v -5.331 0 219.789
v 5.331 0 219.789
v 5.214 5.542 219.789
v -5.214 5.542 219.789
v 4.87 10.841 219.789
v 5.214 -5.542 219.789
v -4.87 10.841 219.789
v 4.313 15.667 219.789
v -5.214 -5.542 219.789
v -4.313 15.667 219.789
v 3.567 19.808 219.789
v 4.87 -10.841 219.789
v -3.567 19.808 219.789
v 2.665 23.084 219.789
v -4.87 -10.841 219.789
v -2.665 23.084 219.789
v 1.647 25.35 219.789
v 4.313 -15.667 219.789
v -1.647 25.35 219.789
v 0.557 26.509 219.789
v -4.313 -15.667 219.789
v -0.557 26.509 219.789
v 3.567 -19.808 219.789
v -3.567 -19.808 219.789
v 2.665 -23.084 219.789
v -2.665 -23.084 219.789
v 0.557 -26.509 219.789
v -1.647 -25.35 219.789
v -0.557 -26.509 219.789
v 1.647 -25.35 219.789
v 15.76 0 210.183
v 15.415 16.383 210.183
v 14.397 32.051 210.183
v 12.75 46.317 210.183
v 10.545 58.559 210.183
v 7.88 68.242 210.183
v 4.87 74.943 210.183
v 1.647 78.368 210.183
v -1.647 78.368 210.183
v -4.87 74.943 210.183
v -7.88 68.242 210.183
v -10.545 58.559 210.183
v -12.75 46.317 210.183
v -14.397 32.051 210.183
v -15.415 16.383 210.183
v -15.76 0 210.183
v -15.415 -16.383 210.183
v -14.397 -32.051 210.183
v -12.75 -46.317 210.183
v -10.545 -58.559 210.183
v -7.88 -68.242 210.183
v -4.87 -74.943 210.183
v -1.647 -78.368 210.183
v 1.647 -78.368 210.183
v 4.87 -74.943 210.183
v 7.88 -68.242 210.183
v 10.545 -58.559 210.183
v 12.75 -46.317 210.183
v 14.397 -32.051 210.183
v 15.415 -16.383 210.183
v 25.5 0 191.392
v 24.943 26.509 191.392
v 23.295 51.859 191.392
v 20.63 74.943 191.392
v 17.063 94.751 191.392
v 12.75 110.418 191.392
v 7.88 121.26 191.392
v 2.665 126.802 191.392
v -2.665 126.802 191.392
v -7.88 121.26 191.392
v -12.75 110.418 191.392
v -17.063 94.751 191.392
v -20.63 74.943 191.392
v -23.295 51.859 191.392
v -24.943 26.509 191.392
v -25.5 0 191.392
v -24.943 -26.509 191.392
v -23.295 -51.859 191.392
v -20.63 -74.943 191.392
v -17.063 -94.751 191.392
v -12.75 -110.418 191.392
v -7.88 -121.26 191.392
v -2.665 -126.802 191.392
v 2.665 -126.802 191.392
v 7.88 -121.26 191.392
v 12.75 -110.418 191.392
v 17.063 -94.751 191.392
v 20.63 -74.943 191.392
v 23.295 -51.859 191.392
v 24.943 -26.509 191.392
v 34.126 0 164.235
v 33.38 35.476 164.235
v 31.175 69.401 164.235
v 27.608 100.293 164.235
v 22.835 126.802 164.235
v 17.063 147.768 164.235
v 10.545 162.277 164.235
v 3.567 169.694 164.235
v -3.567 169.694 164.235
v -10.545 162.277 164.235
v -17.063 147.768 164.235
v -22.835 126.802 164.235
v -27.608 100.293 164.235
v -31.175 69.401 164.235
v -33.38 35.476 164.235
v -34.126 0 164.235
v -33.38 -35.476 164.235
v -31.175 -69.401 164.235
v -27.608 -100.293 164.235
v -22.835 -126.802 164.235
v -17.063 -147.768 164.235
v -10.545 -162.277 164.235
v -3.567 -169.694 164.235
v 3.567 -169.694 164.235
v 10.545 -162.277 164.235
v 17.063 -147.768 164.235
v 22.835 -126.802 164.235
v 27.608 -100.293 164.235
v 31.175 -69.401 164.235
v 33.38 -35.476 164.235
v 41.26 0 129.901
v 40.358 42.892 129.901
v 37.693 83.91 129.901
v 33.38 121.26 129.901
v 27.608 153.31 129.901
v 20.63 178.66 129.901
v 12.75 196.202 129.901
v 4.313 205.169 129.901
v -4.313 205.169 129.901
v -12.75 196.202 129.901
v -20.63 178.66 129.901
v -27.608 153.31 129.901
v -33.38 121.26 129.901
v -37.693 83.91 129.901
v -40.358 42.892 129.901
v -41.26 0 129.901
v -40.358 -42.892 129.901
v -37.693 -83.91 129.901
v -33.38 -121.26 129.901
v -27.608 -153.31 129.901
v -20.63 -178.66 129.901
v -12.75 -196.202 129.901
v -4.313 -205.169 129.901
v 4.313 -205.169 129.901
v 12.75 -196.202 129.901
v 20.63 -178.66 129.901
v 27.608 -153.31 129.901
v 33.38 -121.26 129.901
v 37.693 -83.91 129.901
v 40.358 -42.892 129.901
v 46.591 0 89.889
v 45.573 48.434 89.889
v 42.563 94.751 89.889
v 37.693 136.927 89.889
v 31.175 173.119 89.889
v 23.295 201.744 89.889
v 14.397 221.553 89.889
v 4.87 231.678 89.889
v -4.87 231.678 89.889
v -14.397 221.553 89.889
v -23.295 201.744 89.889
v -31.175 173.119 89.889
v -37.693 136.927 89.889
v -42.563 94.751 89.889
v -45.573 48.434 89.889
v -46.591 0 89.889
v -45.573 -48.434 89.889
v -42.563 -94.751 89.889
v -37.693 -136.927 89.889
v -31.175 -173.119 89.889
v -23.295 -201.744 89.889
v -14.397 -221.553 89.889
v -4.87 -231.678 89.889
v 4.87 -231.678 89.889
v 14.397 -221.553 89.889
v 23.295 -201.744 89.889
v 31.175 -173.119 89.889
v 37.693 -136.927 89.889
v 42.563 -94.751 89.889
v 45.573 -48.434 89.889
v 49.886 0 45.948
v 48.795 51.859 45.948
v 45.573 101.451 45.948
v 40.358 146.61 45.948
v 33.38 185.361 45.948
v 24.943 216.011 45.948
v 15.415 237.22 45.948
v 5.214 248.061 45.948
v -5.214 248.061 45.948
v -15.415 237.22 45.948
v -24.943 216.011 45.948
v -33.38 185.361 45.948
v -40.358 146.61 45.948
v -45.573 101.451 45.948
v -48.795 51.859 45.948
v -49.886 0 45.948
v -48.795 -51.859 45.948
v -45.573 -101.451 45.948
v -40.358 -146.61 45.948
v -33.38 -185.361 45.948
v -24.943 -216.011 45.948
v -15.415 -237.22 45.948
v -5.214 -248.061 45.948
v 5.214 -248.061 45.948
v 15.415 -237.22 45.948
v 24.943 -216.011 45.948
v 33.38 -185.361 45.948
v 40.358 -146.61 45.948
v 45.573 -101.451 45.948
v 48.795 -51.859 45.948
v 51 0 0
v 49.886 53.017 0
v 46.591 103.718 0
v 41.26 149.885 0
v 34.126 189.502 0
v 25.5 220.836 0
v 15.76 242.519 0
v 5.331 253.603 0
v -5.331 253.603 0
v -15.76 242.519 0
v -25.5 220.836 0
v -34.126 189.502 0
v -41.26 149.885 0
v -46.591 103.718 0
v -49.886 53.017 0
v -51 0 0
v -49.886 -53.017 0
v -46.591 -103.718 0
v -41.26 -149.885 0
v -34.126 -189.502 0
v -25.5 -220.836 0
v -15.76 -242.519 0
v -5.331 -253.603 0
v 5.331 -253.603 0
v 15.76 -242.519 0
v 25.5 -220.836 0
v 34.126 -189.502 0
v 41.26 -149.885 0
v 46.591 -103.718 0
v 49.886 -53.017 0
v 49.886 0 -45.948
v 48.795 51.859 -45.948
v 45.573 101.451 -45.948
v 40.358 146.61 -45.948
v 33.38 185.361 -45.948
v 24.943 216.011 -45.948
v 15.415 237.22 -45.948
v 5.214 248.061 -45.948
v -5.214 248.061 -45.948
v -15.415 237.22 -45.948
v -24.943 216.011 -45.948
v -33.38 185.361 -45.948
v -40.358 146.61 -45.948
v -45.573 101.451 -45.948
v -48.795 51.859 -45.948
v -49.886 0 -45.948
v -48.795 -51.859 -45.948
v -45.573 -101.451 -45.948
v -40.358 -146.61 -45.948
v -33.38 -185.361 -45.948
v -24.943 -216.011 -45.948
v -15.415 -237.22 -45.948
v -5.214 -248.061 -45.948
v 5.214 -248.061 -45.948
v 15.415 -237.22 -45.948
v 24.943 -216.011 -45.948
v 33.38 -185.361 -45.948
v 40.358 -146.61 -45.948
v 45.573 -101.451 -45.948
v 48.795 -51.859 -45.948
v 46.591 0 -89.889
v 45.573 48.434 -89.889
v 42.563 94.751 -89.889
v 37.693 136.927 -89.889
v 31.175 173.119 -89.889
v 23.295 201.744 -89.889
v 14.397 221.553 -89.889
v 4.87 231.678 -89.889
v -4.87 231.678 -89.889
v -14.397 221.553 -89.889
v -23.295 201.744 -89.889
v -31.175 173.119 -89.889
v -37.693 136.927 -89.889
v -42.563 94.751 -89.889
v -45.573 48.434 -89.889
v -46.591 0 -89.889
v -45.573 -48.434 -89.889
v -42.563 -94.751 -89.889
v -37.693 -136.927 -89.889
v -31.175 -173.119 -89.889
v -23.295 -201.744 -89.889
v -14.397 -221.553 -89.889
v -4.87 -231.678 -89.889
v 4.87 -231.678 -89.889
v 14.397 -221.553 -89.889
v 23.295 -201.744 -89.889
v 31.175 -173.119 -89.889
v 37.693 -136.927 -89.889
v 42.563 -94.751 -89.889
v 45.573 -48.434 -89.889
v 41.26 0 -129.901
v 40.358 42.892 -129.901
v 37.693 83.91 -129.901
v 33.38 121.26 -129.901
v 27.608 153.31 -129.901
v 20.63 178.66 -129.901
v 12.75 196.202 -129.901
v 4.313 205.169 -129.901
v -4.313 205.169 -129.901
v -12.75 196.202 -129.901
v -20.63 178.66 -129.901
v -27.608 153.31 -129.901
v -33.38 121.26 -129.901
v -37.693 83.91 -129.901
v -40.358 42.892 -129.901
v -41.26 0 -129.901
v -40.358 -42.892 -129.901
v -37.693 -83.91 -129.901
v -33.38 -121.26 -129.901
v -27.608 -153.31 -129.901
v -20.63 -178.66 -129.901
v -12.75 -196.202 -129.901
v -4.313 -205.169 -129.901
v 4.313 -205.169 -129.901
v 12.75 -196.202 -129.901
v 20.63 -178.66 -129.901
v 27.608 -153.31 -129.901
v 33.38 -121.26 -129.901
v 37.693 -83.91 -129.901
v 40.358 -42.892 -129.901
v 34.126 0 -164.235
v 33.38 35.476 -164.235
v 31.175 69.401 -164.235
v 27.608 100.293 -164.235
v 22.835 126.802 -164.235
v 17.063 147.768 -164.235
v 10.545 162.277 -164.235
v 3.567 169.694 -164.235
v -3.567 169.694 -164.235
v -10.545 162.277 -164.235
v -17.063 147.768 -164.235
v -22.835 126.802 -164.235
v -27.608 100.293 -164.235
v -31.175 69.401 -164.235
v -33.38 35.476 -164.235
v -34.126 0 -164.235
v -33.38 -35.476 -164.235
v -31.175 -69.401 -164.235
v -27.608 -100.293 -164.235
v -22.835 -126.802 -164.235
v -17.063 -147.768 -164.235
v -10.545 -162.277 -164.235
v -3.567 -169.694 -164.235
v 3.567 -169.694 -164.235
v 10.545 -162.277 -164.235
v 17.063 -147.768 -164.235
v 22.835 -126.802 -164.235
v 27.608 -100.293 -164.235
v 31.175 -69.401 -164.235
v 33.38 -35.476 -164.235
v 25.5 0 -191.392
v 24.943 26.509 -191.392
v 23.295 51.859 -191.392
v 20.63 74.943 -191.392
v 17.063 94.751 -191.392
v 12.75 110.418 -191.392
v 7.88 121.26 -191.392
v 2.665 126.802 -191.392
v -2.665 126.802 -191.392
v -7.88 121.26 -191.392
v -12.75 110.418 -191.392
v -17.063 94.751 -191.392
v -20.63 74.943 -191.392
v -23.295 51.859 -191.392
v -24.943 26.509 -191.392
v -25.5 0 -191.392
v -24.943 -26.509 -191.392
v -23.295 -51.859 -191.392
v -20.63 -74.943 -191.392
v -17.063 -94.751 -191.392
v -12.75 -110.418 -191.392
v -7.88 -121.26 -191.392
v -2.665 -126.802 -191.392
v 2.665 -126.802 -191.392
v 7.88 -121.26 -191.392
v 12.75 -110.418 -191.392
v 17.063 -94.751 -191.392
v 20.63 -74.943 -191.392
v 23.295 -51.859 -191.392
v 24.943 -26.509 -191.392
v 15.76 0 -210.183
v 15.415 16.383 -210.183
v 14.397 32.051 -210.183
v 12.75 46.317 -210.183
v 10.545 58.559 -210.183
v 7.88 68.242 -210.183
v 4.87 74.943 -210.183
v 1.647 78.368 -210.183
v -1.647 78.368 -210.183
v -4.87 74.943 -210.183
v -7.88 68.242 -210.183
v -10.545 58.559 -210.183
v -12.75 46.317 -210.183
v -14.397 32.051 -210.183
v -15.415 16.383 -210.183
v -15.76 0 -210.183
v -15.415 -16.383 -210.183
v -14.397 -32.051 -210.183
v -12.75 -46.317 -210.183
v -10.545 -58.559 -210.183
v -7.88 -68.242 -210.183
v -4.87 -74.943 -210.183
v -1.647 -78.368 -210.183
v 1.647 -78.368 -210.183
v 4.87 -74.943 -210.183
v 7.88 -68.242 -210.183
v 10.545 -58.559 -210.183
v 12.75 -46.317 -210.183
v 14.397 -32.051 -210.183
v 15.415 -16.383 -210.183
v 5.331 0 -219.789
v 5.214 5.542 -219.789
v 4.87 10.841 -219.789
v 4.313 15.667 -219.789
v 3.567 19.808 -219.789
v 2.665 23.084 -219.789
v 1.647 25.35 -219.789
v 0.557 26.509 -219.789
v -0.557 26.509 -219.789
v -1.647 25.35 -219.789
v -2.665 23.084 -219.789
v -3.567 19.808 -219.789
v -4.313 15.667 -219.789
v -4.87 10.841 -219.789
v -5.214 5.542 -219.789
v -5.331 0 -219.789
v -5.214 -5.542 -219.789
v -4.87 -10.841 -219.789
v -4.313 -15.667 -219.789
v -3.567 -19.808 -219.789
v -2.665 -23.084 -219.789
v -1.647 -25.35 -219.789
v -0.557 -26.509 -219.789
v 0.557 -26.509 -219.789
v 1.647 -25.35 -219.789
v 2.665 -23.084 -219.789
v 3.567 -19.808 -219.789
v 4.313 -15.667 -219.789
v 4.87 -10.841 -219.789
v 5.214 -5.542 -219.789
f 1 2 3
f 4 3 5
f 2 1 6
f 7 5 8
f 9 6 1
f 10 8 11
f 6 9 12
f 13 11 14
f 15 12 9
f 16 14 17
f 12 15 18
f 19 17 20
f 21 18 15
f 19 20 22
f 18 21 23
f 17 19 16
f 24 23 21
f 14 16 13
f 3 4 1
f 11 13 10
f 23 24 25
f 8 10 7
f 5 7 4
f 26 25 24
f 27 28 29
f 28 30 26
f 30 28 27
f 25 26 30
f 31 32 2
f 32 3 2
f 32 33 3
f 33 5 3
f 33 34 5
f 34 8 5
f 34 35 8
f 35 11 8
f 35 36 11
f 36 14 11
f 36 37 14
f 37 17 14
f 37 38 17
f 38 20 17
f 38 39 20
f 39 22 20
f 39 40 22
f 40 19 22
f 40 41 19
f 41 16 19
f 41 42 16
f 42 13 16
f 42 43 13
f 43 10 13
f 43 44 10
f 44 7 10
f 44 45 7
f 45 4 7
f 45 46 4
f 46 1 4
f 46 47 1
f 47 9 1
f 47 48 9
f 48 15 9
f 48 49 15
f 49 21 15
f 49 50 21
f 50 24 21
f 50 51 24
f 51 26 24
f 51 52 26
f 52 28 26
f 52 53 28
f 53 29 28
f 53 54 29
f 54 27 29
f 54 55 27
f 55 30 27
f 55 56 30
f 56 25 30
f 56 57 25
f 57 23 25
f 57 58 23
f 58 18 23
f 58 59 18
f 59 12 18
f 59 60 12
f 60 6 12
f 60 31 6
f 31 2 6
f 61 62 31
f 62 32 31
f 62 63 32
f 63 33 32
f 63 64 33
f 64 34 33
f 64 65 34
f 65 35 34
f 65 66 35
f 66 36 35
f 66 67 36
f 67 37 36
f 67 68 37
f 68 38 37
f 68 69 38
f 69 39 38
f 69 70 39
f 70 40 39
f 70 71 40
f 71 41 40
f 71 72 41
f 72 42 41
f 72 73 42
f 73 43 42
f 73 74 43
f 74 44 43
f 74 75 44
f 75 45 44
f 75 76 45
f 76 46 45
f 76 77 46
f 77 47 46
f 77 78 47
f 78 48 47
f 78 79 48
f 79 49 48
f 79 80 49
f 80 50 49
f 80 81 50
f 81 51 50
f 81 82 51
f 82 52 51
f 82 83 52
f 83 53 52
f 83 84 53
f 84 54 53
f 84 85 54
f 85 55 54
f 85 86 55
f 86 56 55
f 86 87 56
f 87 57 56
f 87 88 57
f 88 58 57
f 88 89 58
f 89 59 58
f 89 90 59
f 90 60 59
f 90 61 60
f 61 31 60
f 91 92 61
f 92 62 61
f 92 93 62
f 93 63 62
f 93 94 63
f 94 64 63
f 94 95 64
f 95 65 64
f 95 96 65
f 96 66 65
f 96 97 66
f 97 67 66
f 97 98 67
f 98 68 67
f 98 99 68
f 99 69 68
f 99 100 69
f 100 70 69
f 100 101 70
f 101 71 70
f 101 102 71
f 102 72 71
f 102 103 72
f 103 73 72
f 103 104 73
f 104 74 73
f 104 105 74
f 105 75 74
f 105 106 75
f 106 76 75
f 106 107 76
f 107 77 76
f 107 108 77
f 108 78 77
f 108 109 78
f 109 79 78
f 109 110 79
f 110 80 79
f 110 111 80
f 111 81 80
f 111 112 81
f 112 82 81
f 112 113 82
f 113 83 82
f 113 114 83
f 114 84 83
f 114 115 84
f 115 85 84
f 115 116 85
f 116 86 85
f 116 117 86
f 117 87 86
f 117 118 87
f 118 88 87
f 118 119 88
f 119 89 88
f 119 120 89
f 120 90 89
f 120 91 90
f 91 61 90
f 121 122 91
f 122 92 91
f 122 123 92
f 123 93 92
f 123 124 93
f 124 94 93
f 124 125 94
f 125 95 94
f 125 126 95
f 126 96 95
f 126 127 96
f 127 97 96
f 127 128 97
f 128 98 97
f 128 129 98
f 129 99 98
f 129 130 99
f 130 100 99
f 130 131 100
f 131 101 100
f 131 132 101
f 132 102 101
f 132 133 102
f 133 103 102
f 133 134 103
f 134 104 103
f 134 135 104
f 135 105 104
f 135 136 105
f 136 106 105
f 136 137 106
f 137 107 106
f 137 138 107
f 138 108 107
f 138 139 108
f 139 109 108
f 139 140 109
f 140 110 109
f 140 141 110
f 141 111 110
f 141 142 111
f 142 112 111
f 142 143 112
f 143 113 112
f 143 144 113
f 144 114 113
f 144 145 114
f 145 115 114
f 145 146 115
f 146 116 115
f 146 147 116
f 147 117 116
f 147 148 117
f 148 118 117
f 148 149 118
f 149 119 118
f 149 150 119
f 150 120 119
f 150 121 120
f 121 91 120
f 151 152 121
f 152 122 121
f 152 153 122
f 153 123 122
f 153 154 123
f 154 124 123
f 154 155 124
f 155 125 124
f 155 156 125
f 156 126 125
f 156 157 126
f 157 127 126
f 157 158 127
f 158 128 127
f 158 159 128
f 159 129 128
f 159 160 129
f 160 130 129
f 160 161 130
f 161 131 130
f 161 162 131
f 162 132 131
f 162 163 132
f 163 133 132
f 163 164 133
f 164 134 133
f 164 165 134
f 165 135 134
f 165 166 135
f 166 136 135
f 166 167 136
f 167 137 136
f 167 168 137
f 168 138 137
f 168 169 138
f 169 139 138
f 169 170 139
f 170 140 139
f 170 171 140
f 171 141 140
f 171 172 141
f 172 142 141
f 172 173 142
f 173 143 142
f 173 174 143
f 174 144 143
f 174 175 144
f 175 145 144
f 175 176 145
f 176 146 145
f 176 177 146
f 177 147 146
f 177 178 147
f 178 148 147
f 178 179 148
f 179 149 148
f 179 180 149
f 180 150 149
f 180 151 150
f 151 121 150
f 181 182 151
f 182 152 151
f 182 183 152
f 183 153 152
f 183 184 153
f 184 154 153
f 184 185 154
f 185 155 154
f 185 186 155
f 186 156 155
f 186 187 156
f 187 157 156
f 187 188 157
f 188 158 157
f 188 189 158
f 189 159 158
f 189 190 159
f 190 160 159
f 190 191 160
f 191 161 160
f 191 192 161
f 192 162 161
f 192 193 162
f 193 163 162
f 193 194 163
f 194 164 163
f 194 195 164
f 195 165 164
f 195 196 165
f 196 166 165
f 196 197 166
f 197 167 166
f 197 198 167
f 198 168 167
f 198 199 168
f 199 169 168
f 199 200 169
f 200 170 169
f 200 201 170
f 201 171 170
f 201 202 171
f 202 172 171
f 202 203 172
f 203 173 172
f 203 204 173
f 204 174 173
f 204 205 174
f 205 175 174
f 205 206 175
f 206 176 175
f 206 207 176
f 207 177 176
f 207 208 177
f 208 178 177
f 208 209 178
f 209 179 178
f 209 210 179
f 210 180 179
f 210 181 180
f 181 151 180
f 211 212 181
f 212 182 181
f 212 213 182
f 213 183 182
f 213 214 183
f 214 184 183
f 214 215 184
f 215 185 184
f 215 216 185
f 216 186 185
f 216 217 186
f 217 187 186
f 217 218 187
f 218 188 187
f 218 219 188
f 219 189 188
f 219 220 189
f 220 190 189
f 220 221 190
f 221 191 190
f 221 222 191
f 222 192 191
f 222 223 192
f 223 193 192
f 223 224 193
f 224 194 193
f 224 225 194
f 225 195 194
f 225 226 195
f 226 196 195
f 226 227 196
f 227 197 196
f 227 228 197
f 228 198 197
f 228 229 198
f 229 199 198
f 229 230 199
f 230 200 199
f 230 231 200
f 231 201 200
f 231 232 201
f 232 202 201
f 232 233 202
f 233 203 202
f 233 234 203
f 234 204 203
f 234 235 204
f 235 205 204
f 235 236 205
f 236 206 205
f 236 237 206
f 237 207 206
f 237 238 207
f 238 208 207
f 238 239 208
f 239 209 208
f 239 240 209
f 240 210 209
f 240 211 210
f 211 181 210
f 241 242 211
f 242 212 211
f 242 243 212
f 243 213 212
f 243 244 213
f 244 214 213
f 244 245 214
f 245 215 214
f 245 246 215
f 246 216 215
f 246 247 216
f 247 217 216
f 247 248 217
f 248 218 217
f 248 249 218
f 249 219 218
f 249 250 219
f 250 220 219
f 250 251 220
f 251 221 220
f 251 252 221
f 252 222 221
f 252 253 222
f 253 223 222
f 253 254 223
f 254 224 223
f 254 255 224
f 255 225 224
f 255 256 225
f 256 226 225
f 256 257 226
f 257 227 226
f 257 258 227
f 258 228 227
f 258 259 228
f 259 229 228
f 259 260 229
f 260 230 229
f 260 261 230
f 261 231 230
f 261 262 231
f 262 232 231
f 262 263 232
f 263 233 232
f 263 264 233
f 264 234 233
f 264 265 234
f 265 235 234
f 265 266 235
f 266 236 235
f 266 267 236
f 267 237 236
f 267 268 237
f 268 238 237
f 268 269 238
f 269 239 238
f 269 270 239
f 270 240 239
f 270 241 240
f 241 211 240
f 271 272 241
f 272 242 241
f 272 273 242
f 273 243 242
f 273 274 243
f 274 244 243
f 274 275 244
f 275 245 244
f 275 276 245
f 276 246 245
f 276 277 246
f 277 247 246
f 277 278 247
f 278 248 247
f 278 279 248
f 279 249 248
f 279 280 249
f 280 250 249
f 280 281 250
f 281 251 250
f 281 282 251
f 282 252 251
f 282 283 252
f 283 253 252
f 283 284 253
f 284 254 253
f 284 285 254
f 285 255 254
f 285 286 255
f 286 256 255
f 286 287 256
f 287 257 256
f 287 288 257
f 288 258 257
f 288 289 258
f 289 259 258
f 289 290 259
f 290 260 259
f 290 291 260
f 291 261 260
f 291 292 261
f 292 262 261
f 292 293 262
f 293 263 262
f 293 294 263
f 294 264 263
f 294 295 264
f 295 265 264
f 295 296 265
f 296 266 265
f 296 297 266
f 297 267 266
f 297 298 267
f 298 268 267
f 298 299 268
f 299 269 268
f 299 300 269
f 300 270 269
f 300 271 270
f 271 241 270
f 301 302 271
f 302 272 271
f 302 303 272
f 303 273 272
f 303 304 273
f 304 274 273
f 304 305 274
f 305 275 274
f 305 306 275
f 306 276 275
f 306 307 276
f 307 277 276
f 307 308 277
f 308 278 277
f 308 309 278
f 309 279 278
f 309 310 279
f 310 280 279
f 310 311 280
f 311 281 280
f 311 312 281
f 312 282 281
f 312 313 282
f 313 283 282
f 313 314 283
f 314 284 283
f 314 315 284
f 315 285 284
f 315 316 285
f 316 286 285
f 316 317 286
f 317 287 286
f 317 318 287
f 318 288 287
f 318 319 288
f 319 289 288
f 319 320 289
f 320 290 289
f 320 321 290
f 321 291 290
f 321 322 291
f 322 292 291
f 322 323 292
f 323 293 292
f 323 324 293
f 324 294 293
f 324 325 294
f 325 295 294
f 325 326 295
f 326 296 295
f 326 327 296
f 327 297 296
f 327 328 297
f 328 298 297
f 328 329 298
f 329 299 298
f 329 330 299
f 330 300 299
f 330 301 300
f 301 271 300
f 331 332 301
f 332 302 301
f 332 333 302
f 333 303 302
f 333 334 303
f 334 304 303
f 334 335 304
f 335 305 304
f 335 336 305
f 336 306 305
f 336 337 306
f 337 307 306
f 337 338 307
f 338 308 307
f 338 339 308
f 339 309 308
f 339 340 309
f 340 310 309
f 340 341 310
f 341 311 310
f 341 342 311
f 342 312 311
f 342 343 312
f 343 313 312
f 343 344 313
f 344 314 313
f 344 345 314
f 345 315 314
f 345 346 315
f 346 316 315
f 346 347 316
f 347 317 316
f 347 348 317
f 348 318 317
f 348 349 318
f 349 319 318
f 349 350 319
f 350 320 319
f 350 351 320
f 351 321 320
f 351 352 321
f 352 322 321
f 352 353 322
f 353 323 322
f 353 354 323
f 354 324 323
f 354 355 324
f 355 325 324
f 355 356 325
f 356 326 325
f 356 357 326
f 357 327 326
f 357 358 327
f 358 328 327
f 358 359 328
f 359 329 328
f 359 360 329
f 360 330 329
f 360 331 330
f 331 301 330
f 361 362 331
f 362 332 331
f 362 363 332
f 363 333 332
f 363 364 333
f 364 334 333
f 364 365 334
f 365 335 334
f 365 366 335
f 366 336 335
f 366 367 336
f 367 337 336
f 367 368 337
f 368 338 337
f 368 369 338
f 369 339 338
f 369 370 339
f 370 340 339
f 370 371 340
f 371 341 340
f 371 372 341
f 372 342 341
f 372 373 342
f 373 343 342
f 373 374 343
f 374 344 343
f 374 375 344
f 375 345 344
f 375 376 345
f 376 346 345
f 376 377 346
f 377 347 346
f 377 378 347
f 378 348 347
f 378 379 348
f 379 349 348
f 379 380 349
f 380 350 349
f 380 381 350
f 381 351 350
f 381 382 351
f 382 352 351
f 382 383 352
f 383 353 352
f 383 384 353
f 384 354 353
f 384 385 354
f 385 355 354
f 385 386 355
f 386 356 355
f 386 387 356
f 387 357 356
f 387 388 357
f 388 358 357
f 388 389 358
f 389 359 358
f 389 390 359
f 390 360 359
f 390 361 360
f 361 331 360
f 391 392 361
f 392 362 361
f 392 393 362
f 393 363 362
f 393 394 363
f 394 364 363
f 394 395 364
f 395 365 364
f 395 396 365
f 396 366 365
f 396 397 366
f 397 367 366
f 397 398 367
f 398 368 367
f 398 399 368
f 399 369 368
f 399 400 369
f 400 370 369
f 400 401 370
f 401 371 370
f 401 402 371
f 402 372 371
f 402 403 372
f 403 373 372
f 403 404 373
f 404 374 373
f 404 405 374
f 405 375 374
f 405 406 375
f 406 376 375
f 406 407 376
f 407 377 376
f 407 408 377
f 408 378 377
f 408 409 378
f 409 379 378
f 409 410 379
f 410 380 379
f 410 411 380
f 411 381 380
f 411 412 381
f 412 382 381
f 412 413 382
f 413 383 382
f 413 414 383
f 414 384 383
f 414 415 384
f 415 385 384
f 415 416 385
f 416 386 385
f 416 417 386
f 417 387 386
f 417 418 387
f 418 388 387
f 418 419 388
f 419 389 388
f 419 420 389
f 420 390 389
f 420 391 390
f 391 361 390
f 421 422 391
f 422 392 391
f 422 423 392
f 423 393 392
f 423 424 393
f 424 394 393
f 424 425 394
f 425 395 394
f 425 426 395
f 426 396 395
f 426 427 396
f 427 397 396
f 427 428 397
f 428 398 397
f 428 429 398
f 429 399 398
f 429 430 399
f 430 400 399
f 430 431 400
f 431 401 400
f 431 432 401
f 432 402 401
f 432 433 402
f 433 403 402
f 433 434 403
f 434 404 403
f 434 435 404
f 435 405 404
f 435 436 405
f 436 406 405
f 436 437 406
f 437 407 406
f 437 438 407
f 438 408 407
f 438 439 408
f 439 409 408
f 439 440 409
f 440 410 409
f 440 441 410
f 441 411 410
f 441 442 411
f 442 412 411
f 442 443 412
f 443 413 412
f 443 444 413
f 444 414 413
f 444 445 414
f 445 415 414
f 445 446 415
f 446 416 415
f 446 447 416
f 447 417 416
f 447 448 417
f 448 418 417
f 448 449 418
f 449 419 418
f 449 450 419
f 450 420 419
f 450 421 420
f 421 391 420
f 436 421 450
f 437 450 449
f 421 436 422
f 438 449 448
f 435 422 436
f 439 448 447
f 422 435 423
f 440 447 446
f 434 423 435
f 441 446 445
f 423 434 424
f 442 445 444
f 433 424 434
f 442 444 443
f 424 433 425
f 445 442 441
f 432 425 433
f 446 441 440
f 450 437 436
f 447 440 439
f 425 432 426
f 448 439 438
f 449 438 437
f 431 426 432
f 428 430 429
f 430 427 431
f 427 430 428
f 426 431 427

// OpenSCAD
// Generated by SolidPython 1.0.1 on 2020-07-29 00:46:45


scale(v = [3, 15, 13]) {
	sphere(r = 17);
}
/***********************************************
*********      SolidPython code:      **********
************************************************
 
# import packages: SolidPython
from solid import *
from solid.utils import *
from itertools import chain, combinations, permutations


class Resize:

    def __init__(self, scad_file):
        self.scad_file = scad_file
        #self.scad_file = import_scad(scad_file)
        # cone/cylinder param:
        self.r1 = 0
        self.r2 = 0
        self.h = 0
        # rectangular prism param:
        self.w = 0
        self.l = 0
        # ellipse param:
        self.r = 0

    # import OpenScad code (file name corresponds to shape)


    # classify shape + parameters
    def assign(self, param1, param2, param3):
        if self.scad_file == 'cone.scad':
            self.r1 = param1
            self.r2 = param2
            self.h = param3
        elif self.scad_file == 'cylinder.scad':
            self.r1 = param1
            self.r2 = param2
            self.h = param3
        elif self.scad_file == 'rectangularPrism.scad':
            self.h = param1
            self.l = param2
            self.w = param3
        else:
            self.r = param1
            self.h = param2

    # resize parameters
    def iterate(self):
        x = range(3, 20, 2)
        i = 1
        if self.scad_file == 'cone.scad':
            tempList = list(permutations(x, 2))
            for temp in tempList:
                param1 = temp[0]
                param2 = temp[1]
                filepath = 'produced_scad_files/' + 'cone' + str(param1) + '_' + str(param2) + '_' + '.scad'
                scad_render_to_file(cylinder(h=param1, r1=param2, r2=0), filepath)

        elif self.scad_file == 'cylinder.scad':
            tempList = list(permutations(x, 3))
            for temp in tempList:
                param1 = temp[0]
                param2 = temp[1]
                filepath = 'produced_scad_files/' + 'cylinder' + str(param1) + '_' + str(param2) + '_' + '.scad'
                scad_render_to_file(cylinder(h=param1, r1=param2, r2=param2), filepath)

        elif self.scad_file == 'rectangularPrism.scad':
            tempList = list(permutations(x, 3))
            for temp in tempList:
                param1 = temp[0]
                param2 = temp[1]
                param3 = temp[2]
                filepath = 'produced_scad_files/' + 'rectangularPrism' + str(param1) + '_' + str(param2) + '_' + str(
                    param3) + '.scad'
                scad_render_to_file(cube(size=(param1, param2, param3)), filepath)

        elif self.scad_file == 'ellipse.scad':
            tempList = list(permutations(x, 4))
            for temp in tempList:
                param1 = temp[0]
                param2 = temp[1]
                param3 = temp[2]
                param4 = temp[3]
                filepath = 'produced_scad_files/' + 'ellipse' + str(param1) + '_' + str(param2) + '_' + str(param3) + '_' + str(param4) + '.scad'
                scad_render_to_file(scale([param1, param2, param3])(sphere(r=param4)), filepath)

    def render_to_scadfile(self):
        scad_render_to_file(scad, 'example.scad') 
 
************************************************/
